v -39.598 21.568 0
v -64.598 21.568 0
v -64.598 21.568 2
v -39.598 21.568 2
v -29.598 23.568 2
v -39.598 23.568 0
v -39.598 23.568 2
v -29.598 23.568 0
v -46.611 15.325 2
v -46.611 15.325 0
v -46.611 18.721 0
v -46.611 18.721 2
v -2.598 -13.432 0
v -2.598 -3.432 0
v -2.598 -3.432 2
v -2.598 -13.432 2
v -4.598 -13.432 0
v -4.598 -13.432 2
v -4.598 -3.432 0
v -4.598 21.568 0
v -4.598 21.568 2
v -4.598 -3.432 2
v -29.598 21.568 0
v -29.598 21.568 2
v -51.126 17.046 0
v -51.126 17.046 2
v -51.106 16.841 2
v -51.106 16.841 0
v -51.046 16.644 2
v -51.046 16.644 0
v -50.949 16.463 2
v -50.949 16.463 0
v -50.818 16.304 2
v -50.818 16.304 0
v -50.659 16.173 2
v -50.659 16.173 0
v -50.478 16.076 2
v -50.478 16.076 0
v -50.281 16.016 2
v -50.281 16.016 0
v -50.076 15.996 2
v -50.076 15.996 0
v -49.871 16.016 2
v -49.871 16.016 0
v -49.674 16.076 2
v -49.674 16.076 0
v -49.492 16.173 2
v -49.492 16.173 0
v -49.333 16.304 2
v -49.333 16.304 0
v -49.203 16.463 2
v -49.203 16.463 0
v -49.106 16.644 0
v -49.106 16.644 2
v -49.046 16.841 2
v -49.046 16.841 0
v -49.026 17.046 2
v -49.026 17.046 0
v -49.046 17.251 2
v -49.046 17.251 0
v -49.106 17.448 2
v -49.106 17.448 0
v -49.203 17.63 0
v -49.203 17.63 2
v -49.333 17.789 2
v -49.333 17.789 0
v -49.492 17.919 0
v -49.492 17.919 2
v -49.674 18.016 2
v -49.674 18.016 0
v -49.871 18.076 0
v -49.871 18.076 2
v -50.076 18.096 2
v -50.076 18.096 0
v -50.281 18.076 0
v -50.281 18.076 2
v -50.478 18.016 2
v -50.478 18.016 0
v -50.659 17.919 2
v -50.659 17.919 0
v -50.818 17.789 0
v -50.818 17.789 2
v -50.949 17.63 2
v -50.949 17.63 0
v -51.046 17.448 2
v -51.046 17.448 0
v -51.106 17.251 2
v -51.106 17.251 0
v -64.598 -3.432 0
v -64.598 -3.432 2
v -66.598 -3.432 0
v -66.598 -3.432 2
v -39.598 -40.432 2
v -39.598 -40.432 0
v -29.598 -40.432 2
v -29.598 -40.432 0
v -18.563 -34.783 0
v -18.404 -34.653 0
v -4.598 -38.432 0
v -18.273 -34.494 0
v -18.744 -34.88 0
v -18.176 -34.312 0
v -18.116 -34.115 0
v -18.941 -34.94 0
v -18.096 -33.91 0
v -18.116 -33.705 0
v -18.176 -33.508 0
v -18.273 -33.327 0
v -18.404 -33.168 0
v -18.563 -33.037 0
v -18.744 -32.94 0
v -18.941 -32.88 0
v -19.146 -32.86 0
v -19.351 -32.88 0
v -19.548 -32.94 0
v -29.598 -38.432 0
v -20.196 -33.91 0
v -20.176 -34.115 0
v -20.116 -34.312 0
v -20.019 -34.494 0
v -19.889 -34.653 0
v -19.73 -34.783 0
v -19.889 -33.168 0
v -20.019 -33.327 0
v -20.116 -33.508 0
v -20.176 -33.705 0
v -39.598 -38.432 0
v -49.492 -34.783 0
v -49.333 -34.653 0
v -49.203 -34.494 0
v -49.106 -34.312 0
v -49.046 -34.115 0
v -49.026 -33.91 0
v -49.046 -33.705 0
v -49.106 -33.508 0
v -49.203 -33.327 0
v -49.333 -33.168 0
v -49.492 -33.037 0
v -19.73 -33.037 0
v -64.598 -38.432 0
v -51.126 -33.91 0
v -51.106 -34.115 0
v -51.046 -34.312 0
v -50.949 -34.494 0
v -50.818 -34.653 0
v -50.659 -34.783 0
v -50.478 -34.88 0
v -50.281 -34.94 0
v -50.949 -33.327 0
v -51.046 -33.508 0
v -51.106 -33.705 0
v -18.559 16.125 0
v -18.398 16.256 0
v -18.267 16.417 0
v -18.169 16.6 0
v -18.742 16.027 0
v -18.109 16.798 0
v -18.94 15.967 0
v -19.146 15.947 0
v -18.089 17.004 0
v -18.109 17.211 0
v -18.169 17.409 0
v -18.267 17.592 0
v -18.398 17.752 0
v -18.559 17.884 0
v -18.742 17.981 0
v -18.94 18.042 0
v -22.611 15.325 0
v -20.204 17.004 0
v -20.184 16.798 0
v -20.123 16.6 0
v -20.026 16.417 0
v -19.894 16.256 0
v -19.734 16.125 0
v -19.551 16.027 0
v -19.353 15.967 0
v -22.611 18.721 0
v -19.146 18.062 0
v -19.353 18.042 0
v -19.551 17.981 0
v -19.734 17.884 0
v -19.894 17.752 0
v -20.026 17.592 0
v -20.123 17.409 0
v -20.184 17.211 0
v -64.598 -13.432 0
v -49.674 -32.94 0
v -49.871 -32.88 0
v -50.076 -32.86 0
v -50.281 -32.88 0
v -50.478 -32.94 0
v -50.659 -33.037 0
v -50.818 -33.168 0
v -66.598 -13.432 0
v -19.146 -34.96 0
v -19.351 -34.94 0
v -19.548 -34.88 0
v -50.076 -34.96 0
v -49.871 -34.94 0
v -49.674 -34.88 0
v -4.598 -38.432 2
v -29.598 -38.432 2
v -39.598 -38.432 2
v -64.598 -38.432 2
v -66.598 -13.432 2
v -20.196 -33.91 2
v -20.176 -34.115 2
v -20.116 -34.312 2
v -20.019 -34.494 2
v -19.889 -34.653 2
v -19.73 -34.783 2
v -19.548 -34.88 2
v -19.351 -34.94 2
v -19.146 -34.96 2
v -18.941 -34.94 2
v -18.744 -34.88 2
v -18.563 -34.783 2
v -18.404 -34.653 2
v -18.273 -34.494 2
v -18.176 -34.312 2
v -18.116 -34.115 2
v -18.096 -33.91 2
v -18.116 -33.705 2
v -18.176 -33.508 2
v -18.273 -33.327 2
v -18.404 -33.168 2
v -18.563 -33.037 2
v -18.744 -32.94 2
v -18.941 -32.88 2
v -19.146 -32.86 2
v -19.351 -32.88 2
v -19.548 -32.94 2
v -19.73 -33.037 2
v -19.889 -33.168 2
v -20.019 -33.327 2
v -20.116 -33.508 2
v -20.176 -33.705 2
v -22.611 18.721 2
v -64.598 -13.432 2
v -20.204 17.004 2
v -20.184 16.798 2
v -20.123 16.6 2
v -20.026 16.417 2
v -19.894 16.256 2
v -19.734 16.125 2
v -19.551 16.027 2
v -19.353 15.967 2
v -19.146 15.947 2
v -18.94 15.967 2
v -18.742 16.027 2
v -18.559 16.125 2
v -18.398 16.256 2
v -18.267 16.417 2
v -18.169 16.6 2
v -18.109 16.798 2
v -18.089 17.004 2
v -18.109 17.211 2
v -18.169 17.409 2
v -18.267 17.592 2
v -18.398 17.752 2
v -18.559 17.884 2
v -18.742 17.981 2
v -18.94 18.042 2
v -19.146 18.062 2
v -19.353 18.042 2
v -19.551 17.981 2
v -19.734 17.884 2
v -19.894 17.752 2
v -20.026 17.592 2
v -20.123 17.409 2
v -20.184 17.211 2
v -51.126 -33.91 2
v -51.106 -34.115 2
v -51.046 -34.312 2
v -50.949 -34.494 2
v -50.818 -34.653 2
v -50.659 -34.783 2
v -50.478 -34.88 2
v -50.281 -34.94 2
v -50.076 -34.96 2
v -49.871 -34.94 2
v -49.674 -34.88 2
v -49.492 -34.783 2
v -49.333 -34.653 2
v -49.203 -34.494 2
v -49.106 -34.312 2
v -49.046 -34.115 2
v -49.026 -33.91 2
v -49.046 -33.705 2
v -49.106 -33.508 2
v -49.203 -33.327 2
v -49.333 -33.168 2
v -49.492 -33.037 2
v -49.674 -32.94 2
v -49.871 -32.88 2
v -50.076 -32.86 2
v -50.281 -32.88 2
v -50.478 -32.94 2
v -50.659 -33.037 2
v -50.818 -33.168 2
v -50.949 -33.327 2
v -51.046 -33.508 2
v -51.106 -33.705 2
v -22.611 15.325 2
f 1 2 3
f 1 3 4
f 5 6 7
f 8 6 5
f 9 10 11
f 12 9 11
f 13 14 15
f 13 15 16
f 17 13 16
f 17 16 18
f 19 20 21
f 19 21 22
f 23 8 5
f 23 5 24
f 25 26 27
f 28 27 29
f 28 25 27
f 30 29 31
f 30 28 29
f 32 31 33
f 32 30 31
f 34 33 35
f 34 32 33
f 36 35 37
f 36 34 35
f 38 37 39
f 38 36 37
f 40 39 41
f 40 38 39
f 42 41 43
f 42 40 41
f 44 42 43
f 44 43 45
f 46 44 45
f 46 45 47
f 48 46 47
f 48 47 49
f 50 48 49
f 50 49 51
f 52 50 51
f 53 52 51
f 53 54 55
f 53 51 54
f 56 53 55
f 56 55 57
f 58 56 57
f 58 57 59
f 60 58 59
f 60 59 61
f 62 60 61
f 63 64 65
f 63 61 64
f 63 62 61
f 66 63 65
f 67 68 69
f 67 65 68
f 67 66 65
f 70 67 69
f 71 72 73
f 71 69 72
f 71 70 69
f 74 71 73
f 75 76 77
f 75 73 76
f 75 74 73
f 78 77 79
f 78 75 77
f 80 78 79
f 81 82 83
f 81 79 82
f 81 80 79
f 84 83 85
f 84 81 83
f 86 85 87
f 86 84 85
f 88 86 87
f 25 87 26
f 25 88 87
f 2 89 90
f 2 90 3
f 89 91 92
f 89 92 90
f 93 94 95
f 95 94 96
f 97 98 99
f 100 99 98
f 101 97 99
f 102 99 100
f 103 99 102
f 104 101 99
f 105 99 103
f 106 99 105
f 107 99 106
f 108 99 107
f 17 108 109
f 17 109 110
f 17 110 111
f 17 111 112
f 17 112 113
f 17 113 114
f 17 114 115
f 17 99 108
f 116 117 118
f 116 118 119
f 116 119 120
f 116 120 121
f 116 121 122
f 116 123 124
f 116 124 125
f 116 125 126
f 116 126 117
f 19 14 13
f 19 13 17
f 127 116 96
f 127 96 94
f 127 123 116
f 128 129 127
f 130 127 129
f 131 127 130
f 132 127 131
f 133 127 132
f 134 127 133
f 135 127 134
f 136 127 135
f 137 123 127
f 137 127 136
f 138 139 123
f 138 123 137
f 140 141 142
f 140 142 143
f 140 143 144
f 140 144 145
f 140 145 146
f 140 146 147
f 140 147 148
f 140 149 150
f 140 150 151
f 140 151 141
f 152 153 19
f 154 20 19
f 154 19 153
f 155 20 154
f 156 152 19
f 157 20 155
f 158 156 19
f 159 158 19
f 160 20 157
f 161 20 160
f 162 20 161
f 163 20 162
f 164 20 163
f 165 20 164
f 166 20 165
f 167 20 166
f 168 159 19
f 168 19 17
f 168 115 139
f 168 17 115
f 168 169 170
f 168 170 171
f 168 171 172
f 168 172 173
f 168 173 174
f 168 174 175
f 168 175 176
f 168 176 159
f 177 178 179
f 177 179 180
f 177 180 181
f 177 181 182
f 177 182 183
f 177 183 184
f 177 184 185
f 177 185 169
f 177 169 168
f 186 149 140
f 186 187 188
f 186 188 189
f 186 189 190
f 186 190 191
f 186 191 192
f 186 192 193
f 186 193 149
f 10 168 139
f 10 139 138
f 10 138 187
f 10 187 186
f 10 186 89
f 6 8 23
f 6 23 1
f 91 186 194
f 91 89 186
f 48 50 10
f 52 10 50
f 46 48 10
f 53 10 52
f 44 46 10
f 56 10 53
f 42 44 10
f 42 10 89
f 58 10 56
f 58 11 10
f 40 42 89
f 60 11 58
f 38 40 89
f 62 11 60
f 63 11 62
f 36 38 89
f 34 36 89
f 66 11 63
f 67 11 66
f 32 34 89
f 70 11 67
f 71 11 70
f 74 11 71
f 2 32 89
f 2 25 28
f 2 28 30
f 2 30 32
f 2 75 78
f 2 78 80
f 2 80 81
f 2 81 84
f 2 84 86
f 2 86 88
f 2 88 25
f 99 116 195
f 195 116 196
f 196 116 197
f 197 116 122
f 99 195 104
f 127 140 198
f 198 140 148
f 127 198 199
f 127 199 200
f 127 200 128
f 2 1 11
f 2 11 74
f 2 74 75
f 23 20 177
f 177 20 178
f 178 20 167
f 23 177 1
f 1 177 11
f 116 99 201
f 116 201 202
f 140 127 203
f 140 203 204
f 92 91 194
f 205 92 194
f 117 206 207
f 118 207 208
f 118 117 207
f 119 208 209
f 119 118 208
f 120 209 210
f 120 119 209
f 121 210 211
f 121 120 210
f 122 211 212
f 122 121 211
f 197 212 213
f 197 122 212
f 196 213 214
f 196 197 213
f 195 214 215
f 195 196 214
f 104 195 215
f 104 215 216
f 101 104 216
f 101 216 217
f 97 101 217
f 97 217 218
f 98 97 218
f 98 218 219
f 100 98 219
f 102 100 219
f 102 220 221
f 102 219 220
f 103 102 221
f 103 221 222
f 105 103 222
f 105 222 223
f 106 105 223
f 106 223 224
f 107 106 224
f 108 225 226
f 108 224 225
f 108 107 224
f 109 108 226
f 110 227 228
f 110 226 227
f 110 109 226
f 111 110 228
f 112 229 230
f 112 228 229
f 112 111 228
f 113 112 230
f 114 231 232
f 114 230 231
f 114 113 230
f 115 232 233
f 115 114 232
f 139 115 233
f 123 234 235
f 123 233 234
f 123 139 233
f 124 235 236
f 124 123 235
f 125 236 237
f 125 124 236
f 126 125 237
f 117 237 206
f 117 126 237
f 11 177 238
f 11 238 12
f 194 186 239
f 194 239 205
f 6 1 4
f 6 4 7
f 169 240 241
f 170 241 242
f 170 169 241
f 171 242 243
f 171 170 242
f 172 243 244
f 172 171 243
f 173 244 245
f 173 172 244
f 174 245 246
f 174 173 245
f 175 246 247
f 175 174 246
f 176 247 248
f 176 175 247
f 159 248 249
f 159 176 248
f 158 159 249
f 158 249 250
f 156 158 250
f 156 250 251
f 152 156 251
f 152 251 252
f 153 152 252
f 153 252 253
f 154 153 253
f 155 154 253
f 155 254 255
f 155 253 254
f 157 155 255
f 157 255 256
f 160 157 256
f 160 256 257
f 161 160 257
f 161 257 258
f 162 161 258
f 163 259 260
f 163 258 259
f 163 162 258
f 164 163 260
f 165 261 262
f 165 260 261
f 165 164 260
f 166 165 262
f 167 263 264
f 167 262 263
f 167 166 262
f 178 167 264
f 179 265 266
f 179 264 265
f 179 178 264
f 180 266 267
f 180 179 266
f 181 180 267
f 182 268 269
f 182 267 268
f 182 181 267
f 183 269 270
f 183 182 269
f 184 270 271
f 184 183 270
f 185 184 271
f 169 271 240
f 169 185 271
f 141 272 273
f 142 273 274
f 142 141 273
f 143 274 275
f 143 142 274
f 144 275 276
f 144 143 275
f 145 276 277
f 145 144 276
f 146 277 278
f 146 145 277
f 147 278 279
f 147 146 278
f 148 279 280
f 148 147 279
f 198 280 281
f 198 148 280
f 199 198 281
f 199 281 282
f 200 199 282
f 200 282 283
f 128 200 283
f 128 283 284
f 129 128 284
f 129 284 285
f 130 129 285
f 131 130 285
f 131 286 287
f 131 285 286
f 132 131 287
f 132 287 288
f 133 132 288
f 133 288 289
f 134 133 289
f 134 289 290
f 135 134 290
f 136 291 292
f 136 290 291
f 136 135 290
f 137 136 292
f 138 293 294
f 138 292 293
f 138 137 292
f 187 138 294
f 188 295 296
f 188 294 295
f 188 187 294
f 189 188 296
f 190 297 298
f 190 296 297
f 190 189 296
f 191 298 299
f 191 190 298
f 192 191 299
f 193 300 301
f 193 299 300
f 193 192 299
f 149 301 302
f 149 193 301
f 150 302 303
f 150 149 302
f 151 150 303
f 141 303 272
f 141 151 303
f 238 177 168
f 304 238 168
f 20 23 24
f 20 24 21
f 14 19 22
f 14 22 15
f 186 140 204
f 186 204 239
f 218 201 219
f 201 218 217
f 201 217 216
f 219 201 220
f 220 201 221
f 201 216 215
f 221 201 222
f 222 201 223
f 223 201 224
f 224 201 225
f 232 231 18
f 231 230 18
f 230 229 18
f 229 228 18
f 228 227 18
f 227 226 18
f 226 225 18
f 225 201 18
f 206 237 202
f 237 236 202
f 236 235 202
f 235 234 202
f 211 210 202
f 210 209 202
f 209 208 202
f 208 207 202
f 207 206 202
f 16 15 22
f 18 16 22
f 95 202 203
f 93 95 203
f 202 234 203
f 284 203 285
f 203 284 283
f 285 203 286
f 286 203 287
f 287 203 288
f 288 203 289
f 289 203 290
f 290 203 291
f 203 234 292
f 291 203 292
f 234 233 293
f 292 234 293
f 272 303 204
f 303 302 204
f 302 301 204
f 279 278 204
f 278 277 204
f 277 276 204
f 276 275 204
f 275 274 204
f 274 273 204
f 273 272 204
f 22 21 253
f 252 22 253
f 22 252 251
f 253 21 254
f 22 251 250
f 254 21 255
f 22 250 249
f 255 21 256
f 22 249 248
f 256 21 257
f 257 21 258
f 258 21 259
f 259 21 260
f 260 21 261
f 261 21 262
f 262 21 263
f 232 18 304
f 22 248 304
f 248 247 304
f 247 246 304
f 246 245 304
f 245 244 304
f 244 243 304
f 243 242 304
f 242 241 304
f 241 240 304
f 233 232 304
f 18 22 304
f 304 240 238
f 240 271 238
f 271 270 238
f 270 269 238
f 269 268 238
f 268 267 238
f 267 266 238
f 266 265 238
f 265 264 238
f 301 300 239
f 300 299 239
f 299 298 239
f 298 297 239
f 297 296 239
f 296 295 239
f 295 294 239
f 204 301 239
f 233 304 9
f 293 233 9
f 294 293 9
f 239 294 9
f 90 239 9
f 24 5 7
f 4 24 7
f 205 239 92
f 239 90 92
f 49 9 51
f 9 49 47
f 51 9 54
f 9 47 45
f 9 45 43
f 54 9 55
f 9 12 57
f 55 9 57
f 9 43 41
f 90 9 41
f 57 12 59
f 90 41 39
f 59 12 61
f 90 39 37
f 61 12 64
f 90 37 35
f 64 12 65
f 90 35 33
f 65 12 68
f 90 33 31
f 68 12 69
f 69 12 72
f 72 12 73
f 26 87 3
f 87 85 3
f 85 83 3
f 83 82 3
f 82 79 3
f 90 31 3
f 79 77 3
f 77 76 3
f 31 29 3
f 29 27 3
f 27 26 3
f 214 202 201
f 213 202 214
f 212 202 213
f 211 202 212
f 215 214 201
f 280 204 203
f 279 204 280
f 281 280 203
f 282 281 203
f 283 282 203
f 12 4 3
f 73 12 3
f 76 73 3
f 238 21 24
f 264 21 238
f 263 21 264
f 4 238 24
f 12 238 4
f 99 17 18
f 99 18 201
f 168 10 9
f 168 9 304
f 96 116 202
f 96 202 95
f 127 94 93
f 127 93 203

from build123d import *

# Parameters (mm, degrees)
EXTRUDE_1_DEPTH     = 2
SKETCH_2_R          = 1.05
SKETCH_2_R_2        = 1.05760355
CUT_EXTRUDE_1_DEPTH = 6
CUT_EXTRUDE_2_DEPTH = 4


with BuildPart() as part:
    # 草图1 → 凸台-拉伸1 (new body)
    with BuildSketch(Plane.XY):
        Polygon((-4.597711938, -13.43249055), (-4.597711938, -38.43249055), (-29.597711938, -38.43249055), (-29.597711938, -40.43249055), (-34.597711938, -40.43249055), (-39.597711938, -40.43249055), (-39.597711938, -38.43249055), (-64.597711938, -38.43249055), (-64.597711938, -13.43249055), (-66.597711938, -13.43249055), (-66.597711938, -8.43249055), (-66.597711938, -3.43249055), (-64.597711938, -3.43249055), (-64.597711938, 21.56750945), (-39.597711938, 21.56750945), (-39.597711938, 23.56750945), (-29.597711938, 23.56750945), (-29.597711938, 21.56750945), (-4.597711938, 21.56750945), (-4.597711938, -3.43249055), (-2.597711938, -3.43249055), (-2.597711938, -13.43249055), align=None)
    extrude(amount=EXTRUDE_1_DEPTH)

    # 草图2 → 切除-拉伸1 (cut)
    with BuildSketch(Plane.XY):
        with Locations(Location((-50.075826656, 17.046317073, 0), (0, 0, 180))):
            Circle(SKETCH_2_R)
        with Locations(Location((-19.146292681, 17.004293118, 0), (0, 0, 180))):
            Circle(SKETCH_2_R_2)
        with Locations(Location((-19.146292681, -33.910264006, 0), (0, 0, 180))):
            Circle(SKETCH_2_R)
        with Locations(Location((-50.075826656, -33.910264006, 0), (0, 0, 180))):
            Circle(SKETCH_2_R)
    extrude(amount=CUT_EXTRUDE_1_DEPTH, mode=Mode.SUBTRACT)

    # 草图4 → 切除-拉伸2 (cut)
    with BuildSketch(Plane.XY):
        Polygon((-32.878676175, 18.720597517), (-22.611059668, 18.720597517), (-22.611059668, 15.325305096), (-32.878676175, 15.325305096), (-46.611059668, 15.325305096), (-46.611059668, 18.720597517), align=None)
    extrude(amount=CUT_EXTRUDE_2_DEPTH, mode=Mode.SUBTRACT)


solid = part.part
